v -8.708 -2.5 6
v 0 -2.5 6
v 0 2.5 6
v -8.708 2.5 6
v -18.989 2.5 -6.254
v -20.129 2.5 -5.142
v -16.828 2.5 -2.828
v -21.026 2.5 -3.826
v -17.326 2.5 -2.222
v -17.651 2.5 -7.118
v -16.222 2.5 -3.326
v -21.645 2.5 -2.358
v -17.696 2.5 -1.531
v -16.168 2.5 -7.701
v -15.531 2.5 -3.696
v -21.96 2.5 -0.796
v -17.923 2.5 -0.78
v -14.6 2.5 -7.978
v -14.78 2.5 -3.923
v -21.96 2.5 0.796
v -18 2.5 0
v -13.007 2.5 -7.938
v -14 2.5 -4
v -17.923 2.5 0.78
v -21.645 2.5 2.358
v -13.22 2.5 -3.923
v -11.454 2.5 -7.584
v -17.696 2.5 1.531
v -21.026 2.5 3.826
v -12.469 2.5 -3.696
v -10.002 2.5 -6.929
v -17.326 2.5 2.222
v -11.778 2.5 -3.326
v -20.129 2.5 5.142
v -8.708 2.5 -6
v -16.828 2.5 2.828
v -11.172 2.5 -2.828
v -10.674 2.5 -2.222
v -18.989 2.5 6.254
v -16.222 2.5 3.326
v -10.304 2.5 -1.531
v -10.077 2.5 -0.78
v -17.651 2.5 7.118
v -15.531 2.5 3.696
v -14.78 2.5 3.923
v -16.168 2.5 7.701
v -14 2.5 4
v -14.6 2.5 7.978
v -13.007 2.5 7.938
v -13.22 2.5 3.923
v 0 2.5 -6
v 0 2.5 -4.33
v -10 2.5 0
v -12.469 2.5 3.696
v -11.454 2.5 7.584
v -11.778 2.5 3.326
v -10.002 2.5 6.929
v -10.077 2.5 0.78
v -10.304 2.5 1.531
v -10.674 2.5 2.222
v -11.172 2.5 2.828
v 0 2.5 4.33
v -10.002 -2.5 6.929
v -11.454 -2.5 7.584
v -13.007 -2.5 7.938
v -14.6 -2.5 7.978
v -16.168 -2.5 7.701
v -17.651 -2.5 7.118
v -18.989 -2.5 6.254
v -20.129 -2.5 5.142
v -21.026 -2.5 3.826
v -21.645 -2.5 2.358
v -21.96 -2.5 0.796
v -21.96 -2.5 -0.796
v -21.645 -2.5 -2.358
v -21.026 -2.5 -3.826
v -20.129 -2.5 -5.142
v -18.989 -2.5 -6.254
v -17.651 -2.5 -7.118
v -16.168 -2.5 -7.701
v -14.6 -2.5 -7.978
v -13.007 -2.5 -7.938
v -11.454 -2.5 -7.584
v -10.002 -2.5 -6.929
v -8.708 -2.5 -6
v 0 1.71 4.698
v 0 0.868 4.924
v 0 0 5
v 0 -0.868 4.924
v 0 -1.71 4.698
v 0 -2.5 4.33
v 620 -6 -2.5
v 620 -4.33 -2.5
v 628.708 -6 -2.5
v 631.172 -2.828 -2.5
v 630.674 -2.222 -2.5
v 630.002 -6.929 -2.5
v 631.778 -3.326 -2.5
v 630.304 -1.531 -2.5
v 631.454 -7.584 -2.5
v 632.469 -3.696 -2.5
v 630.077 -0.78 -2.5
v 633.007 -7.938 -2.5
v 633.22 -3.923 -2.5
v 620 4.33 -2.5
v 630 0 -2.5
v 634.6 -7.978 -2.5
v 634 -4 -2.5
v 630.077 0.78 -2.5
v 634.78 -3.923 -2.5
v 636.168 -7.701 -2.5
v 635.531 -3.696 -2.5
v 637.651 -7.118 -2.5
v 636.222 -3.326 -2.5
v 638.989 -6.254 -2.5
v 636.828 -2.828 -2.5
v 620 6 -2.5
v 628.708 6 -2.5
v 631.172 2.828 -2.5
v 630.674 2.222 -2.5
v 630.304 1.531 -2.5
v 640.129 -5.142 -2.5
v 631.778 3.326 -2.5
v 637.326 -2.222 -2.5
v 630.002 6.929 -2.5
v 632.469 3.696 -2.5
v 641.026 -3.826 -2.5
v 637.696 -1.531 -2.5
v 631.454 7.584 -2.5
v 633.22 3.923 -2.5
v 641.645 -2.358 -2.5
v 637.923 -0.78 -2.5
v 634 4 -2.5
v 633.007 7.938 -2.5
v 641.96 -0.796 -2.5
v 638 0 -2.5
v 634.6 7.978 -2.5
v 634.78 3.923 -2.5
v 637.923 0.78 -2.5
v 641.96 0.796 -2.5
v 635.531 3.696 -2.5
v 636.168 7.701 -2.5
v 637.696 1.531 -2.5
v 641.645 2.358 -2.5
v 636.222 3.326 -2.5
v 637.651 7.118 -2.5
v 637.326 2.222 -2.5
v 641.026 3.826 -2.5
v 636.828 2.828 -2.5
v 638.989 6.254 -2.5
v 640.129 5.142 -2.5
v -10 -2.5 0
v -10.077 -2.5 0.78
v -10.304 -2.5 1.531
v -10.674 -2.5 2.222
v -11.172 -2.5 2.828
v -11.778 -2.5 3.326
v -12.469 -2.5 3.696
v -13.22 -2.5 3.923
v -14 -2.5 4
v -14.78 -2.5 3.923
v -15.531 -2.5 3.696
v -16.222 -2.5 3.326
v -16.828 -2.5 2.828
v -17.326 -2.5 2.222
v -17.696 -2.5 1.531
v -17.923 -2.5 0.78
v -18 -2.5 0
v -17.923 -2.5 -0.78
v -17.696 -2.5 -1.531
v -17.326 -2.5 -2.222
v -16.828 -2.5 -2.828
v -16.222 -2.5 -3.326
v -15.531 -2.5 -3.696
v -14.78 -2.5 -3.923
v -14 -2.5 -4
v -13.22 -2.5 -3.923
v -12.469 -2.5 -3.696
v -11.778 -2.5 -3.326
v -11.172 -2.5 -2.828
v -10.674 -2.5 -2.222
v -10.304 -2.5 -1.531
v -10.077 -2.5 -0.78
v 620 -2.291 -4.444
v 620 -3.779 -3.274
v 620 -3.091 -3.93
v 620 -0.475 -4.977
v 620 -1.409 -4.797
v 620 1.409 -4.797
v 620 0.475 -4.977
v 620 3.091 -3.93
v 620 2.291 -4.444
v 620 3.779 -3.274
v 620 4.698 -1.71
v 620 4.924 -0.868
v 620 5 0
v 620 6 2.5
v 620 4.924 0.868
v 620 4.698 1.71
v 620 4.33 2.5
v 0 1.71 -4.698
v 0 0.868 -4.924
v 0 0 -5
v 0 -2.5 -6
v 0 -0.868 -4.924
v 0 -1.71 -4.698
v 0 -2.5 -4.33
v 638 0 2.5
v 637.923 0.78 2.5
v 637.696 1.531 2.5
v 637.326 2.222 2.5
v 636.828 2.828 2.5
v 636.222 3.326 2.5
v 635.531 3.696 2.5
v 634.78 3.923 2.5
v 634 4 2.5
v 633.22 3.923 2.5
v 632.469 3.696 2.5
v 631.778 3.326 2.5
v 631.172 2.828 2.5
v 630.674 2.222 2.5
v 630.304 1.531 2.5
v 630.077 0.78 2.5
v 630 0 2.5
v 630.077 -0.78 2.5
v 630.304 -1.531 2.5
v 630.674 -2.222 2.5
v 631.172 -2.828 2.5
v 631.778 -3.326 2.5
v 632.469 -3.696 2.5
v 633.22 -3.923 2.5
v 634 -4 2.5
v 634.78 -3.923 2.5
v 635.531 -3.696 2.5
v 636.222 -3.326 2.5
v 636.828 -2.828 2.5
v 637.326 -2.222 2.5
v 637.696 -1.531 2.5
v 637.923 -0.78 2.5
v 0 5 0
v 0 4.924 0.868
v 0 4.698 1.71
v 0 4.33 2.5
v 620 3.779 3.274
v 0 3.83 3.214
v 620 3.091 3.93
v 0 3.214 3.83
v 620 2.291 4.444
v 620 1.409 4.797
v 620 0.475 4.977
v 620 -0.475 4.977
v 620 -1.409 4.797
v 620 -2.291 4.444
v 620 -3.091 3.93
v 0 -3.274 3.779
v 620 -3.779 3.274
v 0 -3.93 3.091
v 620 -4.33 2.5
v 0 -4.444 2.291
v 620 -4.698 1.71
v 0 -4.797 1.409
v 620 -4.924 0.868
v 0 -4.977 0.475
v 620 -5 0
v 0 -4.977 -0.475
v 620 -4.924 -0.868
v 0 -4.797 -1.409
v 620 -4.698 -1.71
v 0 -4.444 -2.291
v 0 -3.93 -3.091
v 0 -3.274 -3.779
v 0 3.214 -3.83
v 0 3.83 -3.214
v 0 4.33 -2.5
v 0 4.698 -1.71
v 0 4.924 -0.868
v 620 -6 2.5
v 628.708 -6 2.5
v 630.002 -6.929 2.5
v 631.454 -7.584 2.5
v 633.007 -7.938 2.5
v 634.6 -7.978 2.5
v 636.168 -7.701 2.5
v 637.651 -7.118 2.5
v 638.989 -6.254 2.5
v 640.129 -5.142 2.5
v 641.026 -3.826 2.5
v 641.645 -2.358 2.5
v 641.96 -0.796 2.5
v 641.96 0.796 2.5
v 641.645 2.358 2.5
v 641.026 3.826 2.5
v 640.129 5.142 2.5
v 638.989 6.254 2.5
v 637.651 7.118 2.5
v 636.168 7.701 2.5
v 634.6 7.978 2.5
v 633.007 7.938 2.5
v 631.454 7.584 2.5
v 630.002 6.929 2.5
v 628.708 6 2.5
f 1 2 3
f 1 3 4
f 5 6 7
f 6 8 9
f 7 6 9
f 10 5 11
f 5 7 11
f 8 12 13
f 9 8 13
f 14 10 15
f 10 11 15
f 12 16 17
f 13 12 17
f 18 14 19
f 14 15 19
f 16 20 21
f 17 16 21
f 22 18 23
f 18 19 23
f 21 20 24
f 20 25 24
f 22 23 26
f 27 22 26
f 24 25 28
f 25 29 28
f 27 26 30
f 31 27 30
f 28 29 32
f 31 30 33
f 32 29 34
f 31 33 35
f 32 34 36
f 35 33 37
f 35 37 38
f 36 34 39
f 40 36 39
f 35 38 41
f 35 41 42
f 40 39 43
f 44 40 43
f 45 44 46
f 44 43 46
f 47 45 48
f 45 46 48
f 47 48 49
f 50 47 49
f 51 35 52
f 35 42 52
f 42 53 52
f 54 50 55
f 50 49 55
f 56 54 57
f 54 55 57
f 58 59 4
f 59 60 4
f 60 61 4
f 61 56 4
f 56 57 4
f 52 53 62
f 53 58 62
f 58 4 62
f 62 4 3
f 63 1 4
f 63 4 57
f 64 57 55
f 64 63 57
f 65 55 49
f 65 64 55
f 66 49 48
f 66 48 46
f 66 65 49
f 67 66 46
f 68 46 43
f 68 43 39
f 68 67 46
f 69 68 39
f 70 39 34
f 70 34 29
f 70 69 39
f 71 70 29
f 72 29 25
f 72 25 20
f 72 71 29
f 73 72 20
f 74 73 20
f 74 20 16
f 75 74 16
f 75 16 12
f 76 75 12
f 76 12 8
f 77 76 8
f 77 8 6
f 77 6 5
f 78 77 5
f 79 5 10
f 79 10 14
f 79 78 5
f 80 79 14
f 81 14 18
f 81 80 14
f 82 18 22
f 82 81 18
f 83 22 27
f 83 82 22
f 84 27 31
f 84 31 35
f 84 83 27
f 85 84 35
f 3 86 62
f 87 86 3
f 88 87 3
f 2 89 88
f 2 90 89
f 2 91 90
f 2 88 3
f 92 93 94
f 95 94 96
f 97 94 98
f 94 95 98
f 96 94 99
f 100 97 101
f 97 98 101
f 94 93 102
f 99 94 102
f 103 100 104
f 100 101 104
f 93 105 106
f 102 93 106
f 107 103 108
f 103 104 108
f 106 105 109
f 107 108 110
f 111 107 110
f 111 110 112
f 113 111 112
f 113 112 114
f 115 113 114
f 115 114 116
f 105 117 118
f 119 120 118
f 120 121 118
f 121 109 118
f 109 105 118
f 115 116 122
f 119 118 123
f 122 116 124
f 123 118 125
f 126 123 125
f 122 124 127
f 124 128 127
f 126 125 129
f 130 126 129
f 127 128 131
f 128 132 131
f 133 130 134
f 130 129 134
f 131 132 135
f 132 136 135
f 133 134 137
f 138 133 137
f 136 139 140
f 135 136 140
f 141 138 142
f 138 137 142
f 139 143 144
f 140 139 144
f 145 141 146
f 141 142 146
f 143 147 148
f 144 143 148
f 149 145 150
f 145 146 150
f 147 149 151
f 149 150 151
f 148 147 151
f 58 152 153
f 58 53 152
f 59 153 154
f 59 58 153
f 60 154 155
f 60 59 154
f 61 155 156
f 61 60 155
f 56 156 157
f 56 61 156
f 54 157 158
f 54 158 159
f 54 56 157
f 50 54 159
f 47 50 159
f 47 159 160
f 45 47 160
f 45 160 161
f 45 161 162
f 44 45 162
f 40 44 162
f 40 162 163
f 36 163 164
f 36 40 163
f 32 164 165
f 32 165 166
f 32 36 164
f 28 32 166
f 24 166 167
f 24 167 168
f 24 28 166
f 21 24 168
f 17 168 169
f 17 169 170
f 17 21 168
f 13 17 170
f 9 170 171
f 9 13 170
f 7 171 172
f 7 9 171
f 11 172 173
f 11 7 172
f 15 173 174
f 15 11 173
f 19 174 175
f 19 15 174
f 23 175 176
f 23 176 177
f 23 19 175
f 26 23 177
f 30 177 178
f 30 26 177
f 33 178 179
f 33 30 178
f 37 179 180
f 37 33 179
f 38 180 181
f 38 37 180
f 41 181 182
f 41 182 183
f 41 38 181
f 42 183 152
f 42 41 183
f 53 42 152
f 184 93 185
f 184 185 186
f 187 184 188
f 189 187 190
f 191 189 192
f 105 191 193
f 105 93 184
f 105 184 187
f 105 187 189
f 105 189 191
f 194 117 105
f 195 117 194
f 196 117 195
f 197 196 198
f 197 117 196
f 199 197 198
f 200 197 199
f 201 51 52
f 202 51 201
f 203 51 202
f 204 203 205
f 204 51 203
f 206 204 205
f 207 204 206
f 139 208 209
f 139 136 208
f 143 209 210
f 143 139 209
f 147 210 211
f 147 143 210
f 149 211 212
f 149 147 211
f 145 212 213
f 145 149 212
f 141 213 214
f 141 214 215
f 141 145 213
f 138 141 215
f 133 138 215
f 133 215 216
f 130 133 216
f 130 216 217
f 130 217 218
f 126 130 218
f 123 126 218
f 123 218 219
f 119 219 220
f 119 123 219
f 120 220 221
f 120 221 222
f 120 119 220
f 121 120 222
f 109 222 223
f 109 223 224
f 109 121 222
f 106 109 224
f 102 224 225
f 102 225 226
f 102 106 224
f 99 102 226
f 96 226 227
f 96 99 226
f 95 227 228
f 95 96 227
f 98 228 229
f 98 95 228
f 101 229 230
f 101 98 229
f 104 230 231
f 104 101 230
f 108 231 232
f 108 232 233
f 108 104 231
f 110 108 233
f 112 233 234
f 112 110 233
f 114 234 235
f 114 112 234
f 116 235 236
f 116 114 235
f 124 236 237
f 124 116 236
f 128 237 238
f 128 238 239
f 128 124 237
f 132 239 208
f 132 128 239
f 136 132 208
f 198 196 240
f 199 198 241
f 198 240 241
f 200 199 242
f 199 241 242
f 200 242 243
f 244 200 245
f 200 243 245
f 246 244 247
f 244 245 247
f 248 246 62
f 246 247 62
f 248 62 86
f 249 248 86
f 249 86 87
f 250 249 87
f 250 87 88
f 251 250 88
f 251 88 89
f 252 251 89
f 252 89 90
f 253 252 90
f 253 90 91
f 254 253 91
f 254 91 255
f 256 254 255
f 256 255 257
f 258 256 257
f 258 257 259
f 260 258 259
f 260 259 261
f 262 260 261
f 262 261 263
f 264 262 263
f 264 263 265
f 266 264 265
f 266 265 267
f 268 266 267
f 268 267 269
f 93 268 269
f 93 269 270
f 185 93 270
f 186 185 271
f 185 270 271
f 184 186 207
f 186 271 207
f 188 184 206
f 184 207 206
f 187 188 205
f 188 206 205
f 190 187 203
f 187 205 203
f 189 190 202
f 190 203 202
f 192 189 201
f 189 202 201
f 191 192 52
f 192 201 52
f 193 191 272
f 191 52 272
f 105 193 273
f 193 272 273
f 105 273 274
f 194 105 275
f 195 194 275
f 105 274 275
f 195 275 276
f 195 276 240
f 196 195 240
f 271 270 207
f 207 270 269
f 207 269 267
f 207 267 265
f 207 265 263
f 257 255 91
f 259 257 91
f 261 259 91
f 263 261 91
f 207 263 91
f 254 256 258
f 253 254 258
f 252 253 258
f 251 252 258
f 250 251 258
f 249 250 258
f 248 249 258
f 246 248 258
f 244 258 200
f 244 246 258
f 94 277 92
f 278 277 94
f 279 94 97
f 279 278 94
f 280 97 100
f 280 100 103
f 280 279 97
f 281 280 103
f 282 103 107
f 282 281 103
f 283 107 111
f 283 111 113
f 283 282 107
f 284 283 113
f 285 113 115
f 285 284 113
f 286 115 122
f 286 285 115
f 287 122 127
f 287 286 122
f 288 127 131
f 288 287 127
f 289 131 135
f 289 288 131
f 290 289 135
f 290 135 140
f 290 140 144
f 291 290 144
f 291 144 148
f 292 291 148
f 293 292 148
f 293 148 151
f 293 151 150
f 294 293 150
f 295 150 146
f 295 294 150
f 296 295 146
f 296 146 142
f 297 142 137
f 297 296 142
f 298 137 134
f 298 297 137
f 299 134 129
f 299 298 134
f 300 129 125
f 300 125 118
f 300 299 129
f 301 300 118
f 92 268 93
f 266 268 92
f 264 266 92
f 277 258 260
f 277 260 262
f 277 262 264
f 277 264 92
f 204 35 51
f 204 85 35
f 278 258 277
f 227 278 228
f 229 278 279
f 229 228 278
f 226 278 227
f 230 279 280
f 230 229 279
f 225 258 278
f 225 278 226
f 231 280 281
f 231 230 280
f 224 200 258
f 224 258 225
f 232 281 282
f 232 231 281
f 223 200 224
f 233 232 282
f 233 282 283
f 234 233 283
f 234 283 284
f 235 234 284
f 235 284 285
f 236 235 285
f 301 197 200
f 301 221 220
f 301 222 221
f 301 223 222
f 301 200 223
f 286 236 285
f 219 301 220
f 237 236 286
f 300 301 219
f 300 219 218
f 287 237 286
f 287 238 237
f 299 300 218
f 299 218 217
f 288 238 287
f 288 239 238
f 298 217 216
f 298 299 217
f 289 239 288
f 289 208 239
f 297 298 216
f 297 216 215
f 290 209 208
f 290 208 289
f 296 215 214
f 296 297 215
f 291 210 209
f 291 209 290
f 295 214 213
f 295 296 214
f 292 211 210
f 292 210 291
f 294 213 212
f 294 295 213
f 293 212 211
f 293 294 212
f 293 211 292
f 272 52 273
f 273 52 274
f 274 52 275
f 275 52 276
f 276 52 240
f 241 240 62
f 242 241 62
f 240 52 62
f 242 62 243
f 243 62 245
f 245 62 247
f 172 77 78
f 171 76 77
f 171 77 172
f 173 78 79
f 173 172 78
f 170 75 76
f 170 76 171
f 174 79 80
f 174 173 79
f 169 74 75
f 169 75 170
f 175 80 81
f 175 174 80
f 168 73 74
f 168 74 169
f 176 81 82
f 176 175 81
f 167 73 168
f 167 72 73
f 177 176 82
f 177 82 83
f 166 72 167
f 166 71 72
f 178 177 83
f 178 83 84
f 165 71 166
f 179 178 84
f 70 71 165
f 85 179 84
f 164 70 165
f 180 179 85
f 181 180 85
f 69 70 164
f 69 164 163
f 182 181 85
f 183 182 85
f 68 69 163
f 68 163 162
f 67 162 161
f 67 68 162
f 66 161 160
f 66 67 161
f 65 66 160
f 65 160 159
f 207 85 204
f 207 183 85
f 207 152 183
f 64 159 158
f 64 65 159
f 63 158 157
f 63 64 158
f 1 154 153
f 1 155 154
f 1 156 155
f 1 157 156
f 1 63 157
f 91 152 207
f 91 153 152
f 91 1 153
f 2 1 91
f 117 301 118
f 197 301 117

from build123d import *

# Parameters (mm, degrees)
F0_R     = 5
F1_DEPTH = 620
F2_R     = 4
F3_DEPTH = 2.5
F4_R     = 4
F5_DEPTH = 2.5


with BuildPart() as f1:
    # F0 (on Right) → F1 (new body)
    with BuildSketch(Plane.YZ):
        Circle(F0_R)
    extrude(amount=F1_DEPTH)

    # F2 (on Front) → F3 (join, symmetric)
    with BuildSketch(Plane.XZ):
        with BuildLine():
            Line((0, -6), (0, 6))
            Line((0, 6), (-8.708497, 6))
            ThreePointArc((-8.708497, 6), (-22, 0), (-8.708497, -6))
            Line((-8.708497, -6), (0, -6))
        make_face()
        with Locations((-14, 0)):
            Circle(F2_R, mode=Mode.SUBTRACT)
    extrude(amount=F3_DEPTH, both=True)

    # F4 (on Top) → F5 (join, symmetric)
    with BuildSketch(Plane.XY):
        with BuildLine():
            Line((628.708497, 6), (620, 6))
            Line((620, 6), (620, -6))
            Line((620, -6), (628.708497, -6))
            ThreePointArc((628.708497, -6), (642, 0), (628.708497, 6))
        make_face()
        with Locations((634, 0)):
            Circle(F4_R, mode=Mode.SUBTRACT)
    extrude(amount=F5_DEPTH, both=True)


solid = f1.part
